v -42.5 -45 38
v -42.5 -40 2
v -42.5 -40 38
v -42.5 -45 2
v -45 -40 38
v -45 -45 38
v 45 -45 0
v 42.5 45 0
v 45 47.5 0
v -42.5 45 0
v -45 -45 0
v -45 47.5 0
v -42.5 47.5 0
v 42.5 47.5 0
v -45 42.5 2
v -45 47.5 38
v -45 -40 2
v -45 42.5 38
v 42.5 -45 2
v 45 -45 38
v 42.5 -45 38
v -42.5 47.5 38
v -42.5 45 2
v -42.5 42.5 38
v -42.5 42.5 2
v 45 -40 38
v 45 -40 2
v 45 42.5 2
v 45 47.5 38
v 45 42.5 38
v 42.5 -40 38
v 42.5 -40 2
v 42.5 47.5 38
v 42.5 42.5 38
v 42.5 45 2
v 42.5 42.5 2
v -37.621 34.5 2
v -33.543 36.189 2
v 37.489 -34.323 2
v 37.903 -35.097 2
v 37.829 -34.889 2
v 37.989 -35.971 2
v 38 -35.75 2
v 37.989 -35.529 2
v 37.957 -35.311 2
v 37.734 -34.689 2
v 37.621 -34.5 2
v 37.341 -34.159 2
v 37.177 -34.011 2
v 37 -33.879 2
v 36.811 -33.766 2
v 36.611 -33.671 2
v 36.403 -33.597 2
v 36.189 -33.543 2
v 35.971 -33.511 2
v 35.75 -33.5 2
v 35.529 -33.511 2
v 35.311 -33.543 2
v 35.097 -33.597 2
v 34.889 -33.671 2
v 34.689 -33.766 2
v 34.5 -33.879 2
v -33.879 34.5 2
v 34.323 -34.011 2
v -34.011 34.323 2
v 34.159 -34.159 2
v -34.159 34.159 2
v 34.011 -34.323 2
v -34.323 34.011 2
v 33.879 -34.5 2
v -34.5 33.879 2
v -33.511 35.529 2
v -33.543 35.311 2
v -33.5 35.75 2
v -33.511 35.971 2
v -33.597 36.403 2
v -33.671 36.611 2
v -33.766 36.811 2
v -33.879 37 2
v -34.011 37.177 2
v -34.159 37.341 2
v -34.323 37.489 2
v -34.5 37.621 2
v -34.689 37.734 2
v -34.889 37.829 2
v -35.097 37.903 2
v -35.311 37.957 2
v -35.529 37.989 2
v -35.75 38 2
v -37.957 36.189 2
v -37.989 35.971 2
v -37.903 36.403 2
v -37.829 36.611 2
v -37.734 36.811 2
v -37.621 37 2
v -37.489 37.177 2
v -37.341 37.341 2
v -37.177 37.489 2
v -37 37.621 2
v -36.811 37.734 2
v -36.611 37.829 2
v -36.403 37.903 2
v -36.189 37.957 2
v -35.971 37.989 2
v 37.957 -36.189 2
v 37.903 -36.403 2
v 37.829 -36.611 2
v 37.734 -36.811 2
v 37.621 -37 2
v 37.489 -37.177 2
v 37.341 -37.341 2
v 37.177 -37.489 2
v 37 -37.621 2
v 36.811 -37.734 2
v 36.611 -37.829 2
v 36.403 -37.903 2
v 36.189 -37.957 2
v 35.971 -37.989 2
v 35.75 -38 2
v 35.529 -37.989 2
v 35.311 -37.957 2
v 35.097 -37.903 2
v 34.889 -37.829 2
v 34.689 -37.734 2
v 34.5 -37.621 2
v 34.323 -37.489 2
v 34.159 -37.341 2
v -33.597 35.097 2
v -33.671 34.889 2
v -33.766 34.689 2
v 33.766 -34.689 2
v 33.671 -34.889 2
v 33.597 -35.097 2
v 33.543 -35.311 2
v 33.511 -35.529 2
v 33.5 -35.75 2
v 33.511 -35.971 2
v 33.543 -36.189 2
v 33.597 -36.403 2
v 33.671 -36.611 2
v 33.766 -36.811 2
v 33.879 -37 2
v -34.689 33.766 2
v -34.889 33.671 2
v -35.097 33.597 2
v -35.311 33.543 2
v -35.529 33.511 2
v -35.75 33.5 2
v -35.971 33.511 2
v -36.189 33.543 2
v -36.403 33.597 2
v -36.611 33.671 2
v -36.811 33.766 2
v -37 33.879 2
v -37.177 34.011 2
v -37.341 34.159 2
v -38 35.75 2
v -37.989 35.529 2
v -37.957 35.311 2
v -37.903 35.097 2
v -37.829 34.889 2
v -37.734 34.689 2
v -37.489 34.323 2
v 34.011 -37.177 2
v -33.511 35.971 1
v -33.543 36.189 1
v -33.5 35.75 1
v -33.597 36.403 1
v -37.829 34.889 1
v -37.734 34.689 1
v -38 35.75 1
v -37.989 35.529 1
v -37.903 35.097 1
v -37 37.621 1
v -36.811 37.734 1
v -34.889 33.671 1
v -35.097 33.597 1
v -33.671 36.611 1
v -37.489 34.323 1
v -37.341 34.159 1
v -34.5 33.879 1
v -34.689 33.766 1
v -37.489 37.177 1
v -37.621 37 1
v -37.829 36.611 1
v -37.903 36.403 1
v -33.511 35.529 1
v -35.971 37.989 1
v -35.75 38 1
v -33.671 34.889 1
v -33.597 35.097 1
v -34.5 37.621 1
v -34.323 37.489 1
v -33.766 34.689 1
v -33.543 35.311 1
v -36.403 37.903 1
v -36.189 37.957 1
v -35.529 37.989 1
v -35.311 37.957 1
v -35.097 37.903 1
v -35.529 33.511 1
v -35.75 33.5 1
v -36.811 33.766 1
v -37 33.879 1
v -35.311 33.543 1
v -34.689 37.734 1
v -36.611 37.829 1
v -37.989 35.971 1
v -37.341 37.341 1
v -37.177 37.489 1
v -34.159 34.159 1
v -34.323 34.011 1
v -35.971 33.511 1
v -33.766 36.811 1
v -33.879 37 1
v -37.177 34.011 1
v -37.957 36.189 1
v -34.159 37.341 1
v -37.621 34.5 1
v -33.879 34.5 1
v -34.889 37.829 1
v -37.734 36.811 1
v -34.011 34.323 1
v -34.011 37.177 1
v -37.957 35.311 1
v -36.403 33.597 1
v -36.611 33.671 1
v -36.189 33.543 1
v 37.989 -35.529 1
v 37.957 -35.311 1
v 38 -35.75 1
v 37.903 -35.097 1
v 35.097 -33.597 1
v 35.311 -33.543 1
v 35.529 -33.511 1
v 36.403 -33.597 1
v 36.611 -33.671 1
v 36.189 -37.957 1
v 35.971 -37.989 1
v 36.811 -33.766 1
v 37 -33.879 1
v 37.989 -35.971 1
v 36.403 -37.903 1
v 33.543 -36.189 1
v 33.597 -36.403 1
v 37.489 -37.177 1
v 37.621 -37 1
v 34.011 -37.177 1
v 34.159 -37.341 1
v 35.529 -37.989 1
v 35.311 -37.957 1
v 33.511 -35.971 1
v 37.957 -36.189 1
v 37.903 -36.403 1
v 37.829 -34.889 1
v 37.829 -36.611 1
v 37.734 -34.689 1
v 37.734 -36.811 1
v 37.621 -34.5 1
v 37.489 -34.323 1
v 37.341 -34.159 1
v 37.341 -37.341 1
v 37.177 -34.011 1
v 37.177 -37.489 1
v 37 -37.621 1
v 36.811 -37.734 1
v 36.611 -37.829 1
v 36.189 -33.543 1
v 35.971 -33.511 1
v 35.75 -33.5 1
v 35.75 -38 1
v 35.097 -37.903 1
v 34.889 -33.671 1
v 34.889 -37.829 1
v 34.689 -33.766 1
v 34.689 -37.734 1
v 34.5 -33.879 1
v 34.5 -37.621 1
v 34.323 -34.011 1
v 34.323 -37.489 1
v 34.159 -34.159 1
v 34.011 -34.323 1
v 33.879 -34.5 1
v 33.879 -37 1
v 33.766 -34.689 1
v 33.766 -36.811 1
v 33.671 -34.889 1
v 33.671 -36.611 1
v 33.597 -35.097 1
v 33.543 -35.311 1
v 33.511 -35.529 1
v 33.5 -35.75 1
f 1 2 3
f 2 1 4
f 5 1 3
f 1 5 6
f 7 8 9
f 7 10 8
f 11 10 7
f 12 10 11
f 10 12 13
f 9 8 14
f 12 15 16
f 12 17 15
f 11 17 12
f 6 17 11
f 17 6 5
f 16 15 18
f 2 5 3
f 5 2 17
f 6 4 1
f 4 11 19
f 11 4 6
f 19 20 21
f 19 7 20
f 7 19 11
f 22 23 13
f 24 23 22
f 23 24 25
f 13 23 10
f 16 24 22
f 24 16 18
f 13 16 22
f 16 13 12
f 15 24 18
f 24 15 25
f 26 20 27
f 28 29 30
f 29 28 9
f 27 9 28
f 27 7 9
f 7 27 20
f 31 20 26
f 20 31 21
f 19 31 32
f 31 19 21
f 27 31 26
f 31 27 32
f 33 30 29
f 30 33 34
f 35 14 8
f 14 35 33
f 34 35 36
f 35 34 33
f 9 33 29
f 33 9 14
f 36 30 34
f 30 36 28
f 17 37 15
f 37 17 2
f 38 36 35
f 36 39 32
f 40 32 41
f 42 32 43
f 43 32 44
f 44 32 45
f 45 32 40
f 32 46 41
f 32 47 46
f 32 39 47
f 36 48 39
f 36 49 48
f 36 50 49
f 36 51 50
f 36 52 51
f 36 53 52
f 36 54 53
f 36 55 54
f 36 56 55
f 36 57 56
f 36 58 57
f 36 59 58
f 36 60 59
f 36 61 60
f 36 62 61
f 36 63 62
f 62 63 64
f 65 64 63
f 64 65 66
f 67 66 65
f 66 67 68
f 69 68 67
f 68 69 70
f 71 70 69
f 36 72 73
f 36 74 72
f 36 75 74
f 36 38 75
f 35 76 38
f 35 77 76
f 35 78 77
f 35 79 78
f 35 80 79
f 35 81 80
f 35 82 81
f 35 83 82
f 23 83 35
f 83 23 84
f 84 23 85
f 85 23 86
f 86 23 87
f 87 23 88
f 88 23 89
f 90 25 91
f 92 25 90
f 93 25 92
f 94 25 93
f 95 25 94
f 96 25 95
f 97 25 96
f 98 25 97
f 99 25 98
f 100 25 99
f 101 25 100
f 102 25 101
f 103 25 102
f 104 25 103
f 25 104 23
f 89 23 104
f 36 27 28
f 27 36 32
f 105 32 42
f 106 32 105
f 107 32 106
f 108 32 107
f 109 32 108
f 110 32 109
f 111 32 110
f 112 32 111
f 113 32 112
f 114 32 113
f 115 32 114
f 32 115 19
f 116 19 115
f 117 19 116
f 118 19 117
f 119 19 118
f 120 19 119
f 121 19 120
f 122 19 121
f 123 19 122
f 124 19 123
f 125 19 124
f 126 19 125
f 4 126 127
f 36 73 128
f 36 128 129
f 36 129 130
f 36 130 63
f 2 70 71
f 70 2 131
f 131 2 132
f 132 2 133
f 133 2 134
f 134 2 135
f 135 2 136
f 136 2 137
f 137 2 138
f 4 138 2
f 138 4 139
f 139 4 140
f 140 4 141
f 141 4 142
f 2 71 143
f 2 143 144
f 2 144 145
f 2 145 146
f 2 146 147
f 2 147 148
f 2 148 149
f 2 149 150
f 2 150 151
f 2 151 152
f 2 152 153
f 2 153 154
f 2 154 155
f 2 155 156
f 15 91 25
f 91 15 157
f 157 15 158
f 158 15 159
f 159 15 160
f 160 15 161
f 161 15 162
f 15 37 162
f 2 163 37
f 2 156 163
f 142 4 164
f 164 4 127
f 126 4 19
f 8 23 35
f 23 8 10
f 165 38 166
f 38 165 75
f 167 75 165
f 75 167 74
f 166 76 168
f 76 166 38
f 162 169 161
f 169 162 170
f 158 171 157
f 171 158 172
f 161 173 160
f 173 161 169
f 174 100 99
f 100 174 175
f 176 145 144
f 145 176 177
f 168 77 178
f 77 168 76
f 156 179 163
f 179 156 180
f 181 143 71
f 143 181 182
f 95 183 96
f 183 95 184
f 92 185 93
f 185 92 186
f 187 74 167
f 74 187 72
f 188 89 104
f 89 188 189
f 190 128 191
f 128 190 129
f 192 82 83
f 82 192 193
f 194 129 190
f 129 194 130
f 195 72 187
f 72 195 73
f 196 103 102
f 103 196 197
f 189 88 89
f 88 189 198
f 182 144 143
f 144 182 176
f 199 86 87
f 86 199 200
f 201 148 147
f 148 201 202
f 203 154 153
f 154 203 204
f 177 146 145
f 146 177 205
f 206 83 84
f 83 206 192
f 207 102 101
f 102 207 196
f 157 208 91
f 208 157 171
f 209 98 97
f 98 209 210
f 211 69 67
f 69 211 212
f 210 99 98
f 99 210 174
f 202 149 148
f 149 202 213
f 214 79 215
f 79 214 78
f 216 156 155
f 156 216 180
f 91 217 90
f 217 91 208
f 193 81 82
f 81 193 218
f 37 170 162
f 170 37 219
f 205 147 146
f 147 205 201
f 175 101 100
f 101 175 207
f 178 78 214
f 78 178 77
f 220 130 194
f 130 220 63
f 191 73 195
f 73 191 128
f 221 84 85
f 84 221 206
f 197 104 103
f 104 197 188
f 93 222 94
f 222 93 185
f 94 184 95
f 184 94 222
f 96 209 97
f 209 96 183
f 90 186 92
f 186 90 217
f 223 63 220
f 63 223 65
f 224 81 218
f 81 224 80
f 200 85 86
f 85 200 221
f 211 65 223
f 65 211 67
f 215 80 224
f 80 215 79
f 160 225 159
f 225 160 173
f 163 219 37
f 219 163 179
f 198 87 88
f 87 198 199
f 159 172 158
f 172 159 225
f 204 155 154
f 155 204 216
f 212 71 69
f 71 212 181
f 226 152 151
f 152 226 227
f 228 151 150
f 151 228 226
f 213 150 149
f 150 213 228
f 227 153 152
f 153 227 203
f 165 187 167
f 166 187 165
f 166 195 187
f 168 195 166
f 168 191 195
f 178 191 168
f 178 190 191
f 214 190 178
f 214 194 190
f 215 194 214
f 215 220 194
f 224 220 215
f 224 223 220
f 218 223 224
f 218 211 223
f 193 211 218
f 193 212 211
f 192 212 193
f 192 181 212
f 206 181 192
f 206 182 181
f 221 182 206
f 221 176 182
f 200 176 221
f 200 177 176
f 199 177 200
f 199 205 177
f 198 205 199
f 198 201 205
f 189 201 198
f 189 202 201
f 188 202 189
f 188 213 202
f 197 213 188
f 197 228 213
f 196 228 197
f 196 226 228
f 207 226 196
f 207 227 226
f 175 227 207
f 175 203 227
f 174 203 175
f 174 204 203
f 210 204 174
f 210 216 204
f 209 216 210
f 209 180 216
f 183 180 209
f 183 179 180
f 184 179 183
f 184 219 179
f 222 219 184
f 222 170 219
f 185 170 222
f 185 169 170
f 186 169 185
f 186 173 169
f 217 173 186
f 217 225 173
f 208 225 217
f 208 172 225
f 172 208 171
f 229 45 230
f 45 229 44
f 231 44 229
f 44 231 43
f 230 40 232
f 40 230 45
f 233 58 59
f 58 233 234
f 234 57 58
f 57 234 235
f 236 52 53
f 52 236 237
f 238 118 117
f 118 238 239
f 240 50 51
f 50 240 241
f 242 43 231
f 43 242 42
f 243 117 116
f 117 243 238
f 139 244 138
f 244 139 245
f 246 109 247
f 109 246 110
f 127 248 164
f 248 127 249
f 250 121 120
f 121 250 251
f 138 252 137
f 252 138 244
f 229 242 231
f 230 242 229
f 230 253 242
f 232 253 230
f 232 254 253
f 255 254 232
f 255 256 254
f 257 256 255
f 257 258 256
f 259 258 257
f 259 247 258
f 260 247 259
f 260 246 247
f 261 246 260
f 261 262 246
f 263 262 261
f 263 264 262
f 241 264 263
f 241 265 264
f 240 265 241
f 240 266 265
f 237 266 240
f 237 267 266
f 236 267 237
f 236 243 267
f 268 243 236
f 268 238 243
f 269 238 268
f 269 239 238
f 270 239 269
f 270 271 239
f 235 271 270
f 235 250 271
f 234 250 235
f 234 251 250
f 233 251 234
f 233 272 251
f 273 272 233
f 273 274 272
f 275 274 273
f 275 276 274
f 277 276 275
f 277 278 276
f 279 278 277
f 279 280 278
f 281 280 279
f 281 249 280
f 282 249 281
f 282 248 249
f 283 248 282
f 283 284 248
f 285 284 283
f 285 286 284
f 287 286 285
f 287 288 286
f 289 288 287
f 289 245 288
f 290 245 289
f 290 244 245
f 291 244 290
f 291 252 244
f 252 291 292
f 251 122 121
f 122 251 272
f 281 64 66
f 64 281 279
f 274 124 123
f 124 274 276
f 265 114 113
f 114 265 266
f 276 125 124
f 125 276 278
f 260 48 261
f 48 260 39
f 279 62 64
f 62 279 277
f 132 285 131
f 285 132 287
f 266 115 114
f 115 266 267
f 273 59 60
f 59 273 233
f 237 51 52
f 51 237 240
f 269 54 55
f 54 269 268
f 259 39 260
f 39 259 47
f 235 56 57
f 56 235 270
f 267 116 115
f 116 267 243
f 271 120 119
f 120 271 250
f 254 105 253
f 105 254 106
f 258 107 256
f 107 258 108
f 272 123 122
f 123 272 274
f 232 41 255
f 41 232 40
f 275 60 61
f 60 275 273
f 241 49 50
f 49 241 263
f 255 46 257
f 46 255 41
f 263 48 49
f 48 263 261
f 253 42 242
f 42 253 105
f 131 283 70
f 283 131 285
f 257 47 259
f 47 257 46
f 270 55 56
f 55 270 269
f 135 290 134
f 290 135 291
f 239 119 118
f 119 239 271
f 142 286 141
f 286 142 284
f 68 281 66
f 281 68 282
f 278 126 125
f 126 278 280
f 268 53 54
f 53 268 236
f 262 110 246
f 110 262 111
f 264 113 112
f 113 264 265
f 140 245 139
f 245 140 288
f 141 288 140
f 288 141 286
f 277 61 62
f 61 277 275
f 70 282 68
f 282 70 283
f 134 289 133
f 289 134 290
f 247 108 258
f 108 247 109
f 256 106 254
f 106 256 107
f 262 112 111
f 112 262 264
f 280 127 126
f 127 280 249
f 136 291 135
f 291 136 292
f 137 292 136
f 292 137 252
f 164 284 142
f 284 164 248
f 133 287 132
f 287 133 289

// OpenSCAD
// Magnetic stirrer housing - upside-down open box over a 80 mm PC fan
// Print orientation: top plate on the bed (z = 0), walls rise to z = 40

$fn = 64;

// ---- Dimensions (mm) ----
box_outer_x      = 90;    // outer size in X
box_outer_y      = 90;    // outer size in Y
top_plate_t      = 2;     // top plate thickness (z = 0 to 2)
wall_t           = 2.5;   // wall thickness
wall_top_z       = 40;    // open top of box (z)
screw_hole_d     = 4.5;   // M4 screw hole diameter
screw_hole_pitch = 71.5;  // square pattern size for holes
cable_notch_w    = 12;    // notch width for power cable
cable_notch_bot  = 8;     // notch depth from open edge (z = 32 to 40)
eps              = 0.5;   // overshoot for clean cuts

difference() {
    // Main box body
    union() {
        // Top plate
        translate([-box_outer_x/2, -box_outer_y/2, 0])
            cube([box_outer_x, box_outer_y, top_plate_t]);
        // Four walls from top plate up to open top
        for (sx = [-1, 1], sy = [-1, 1])
            translate([sx > 0 ? box_outer_x/2 - wall_t : -box_outer_x/2,
                       sy > 0 ? box_outer_y/2 - wall_t : -box_outer_y/2,
                       0])
                cube([wall_t, box_outer_y - box_outer_x + 2*wall_t,
                      wall_top_z - top_plate_t]);
    }

    // Screw holes through top plate, centred on plate
    for (i = [0 : 3])
        translate([(i < 2 ? -1 : 1) * screw_hole_pitch/2,
                   (i >= 2 ? -1 : 1) * screw_hole_pitch/2,
                   top_plate_t/2])
            cylinder(d = screw_hole_d, h = top_plate_t + eps);

    // Cable notch in one wall, centred along the wall
    translate([box_outer_x/2 - wall_t, 0, wall_top_z - cable_notch_bot])
        cube([wall_t, cable_notch_w, cable_notch_bot + eps]);
}
